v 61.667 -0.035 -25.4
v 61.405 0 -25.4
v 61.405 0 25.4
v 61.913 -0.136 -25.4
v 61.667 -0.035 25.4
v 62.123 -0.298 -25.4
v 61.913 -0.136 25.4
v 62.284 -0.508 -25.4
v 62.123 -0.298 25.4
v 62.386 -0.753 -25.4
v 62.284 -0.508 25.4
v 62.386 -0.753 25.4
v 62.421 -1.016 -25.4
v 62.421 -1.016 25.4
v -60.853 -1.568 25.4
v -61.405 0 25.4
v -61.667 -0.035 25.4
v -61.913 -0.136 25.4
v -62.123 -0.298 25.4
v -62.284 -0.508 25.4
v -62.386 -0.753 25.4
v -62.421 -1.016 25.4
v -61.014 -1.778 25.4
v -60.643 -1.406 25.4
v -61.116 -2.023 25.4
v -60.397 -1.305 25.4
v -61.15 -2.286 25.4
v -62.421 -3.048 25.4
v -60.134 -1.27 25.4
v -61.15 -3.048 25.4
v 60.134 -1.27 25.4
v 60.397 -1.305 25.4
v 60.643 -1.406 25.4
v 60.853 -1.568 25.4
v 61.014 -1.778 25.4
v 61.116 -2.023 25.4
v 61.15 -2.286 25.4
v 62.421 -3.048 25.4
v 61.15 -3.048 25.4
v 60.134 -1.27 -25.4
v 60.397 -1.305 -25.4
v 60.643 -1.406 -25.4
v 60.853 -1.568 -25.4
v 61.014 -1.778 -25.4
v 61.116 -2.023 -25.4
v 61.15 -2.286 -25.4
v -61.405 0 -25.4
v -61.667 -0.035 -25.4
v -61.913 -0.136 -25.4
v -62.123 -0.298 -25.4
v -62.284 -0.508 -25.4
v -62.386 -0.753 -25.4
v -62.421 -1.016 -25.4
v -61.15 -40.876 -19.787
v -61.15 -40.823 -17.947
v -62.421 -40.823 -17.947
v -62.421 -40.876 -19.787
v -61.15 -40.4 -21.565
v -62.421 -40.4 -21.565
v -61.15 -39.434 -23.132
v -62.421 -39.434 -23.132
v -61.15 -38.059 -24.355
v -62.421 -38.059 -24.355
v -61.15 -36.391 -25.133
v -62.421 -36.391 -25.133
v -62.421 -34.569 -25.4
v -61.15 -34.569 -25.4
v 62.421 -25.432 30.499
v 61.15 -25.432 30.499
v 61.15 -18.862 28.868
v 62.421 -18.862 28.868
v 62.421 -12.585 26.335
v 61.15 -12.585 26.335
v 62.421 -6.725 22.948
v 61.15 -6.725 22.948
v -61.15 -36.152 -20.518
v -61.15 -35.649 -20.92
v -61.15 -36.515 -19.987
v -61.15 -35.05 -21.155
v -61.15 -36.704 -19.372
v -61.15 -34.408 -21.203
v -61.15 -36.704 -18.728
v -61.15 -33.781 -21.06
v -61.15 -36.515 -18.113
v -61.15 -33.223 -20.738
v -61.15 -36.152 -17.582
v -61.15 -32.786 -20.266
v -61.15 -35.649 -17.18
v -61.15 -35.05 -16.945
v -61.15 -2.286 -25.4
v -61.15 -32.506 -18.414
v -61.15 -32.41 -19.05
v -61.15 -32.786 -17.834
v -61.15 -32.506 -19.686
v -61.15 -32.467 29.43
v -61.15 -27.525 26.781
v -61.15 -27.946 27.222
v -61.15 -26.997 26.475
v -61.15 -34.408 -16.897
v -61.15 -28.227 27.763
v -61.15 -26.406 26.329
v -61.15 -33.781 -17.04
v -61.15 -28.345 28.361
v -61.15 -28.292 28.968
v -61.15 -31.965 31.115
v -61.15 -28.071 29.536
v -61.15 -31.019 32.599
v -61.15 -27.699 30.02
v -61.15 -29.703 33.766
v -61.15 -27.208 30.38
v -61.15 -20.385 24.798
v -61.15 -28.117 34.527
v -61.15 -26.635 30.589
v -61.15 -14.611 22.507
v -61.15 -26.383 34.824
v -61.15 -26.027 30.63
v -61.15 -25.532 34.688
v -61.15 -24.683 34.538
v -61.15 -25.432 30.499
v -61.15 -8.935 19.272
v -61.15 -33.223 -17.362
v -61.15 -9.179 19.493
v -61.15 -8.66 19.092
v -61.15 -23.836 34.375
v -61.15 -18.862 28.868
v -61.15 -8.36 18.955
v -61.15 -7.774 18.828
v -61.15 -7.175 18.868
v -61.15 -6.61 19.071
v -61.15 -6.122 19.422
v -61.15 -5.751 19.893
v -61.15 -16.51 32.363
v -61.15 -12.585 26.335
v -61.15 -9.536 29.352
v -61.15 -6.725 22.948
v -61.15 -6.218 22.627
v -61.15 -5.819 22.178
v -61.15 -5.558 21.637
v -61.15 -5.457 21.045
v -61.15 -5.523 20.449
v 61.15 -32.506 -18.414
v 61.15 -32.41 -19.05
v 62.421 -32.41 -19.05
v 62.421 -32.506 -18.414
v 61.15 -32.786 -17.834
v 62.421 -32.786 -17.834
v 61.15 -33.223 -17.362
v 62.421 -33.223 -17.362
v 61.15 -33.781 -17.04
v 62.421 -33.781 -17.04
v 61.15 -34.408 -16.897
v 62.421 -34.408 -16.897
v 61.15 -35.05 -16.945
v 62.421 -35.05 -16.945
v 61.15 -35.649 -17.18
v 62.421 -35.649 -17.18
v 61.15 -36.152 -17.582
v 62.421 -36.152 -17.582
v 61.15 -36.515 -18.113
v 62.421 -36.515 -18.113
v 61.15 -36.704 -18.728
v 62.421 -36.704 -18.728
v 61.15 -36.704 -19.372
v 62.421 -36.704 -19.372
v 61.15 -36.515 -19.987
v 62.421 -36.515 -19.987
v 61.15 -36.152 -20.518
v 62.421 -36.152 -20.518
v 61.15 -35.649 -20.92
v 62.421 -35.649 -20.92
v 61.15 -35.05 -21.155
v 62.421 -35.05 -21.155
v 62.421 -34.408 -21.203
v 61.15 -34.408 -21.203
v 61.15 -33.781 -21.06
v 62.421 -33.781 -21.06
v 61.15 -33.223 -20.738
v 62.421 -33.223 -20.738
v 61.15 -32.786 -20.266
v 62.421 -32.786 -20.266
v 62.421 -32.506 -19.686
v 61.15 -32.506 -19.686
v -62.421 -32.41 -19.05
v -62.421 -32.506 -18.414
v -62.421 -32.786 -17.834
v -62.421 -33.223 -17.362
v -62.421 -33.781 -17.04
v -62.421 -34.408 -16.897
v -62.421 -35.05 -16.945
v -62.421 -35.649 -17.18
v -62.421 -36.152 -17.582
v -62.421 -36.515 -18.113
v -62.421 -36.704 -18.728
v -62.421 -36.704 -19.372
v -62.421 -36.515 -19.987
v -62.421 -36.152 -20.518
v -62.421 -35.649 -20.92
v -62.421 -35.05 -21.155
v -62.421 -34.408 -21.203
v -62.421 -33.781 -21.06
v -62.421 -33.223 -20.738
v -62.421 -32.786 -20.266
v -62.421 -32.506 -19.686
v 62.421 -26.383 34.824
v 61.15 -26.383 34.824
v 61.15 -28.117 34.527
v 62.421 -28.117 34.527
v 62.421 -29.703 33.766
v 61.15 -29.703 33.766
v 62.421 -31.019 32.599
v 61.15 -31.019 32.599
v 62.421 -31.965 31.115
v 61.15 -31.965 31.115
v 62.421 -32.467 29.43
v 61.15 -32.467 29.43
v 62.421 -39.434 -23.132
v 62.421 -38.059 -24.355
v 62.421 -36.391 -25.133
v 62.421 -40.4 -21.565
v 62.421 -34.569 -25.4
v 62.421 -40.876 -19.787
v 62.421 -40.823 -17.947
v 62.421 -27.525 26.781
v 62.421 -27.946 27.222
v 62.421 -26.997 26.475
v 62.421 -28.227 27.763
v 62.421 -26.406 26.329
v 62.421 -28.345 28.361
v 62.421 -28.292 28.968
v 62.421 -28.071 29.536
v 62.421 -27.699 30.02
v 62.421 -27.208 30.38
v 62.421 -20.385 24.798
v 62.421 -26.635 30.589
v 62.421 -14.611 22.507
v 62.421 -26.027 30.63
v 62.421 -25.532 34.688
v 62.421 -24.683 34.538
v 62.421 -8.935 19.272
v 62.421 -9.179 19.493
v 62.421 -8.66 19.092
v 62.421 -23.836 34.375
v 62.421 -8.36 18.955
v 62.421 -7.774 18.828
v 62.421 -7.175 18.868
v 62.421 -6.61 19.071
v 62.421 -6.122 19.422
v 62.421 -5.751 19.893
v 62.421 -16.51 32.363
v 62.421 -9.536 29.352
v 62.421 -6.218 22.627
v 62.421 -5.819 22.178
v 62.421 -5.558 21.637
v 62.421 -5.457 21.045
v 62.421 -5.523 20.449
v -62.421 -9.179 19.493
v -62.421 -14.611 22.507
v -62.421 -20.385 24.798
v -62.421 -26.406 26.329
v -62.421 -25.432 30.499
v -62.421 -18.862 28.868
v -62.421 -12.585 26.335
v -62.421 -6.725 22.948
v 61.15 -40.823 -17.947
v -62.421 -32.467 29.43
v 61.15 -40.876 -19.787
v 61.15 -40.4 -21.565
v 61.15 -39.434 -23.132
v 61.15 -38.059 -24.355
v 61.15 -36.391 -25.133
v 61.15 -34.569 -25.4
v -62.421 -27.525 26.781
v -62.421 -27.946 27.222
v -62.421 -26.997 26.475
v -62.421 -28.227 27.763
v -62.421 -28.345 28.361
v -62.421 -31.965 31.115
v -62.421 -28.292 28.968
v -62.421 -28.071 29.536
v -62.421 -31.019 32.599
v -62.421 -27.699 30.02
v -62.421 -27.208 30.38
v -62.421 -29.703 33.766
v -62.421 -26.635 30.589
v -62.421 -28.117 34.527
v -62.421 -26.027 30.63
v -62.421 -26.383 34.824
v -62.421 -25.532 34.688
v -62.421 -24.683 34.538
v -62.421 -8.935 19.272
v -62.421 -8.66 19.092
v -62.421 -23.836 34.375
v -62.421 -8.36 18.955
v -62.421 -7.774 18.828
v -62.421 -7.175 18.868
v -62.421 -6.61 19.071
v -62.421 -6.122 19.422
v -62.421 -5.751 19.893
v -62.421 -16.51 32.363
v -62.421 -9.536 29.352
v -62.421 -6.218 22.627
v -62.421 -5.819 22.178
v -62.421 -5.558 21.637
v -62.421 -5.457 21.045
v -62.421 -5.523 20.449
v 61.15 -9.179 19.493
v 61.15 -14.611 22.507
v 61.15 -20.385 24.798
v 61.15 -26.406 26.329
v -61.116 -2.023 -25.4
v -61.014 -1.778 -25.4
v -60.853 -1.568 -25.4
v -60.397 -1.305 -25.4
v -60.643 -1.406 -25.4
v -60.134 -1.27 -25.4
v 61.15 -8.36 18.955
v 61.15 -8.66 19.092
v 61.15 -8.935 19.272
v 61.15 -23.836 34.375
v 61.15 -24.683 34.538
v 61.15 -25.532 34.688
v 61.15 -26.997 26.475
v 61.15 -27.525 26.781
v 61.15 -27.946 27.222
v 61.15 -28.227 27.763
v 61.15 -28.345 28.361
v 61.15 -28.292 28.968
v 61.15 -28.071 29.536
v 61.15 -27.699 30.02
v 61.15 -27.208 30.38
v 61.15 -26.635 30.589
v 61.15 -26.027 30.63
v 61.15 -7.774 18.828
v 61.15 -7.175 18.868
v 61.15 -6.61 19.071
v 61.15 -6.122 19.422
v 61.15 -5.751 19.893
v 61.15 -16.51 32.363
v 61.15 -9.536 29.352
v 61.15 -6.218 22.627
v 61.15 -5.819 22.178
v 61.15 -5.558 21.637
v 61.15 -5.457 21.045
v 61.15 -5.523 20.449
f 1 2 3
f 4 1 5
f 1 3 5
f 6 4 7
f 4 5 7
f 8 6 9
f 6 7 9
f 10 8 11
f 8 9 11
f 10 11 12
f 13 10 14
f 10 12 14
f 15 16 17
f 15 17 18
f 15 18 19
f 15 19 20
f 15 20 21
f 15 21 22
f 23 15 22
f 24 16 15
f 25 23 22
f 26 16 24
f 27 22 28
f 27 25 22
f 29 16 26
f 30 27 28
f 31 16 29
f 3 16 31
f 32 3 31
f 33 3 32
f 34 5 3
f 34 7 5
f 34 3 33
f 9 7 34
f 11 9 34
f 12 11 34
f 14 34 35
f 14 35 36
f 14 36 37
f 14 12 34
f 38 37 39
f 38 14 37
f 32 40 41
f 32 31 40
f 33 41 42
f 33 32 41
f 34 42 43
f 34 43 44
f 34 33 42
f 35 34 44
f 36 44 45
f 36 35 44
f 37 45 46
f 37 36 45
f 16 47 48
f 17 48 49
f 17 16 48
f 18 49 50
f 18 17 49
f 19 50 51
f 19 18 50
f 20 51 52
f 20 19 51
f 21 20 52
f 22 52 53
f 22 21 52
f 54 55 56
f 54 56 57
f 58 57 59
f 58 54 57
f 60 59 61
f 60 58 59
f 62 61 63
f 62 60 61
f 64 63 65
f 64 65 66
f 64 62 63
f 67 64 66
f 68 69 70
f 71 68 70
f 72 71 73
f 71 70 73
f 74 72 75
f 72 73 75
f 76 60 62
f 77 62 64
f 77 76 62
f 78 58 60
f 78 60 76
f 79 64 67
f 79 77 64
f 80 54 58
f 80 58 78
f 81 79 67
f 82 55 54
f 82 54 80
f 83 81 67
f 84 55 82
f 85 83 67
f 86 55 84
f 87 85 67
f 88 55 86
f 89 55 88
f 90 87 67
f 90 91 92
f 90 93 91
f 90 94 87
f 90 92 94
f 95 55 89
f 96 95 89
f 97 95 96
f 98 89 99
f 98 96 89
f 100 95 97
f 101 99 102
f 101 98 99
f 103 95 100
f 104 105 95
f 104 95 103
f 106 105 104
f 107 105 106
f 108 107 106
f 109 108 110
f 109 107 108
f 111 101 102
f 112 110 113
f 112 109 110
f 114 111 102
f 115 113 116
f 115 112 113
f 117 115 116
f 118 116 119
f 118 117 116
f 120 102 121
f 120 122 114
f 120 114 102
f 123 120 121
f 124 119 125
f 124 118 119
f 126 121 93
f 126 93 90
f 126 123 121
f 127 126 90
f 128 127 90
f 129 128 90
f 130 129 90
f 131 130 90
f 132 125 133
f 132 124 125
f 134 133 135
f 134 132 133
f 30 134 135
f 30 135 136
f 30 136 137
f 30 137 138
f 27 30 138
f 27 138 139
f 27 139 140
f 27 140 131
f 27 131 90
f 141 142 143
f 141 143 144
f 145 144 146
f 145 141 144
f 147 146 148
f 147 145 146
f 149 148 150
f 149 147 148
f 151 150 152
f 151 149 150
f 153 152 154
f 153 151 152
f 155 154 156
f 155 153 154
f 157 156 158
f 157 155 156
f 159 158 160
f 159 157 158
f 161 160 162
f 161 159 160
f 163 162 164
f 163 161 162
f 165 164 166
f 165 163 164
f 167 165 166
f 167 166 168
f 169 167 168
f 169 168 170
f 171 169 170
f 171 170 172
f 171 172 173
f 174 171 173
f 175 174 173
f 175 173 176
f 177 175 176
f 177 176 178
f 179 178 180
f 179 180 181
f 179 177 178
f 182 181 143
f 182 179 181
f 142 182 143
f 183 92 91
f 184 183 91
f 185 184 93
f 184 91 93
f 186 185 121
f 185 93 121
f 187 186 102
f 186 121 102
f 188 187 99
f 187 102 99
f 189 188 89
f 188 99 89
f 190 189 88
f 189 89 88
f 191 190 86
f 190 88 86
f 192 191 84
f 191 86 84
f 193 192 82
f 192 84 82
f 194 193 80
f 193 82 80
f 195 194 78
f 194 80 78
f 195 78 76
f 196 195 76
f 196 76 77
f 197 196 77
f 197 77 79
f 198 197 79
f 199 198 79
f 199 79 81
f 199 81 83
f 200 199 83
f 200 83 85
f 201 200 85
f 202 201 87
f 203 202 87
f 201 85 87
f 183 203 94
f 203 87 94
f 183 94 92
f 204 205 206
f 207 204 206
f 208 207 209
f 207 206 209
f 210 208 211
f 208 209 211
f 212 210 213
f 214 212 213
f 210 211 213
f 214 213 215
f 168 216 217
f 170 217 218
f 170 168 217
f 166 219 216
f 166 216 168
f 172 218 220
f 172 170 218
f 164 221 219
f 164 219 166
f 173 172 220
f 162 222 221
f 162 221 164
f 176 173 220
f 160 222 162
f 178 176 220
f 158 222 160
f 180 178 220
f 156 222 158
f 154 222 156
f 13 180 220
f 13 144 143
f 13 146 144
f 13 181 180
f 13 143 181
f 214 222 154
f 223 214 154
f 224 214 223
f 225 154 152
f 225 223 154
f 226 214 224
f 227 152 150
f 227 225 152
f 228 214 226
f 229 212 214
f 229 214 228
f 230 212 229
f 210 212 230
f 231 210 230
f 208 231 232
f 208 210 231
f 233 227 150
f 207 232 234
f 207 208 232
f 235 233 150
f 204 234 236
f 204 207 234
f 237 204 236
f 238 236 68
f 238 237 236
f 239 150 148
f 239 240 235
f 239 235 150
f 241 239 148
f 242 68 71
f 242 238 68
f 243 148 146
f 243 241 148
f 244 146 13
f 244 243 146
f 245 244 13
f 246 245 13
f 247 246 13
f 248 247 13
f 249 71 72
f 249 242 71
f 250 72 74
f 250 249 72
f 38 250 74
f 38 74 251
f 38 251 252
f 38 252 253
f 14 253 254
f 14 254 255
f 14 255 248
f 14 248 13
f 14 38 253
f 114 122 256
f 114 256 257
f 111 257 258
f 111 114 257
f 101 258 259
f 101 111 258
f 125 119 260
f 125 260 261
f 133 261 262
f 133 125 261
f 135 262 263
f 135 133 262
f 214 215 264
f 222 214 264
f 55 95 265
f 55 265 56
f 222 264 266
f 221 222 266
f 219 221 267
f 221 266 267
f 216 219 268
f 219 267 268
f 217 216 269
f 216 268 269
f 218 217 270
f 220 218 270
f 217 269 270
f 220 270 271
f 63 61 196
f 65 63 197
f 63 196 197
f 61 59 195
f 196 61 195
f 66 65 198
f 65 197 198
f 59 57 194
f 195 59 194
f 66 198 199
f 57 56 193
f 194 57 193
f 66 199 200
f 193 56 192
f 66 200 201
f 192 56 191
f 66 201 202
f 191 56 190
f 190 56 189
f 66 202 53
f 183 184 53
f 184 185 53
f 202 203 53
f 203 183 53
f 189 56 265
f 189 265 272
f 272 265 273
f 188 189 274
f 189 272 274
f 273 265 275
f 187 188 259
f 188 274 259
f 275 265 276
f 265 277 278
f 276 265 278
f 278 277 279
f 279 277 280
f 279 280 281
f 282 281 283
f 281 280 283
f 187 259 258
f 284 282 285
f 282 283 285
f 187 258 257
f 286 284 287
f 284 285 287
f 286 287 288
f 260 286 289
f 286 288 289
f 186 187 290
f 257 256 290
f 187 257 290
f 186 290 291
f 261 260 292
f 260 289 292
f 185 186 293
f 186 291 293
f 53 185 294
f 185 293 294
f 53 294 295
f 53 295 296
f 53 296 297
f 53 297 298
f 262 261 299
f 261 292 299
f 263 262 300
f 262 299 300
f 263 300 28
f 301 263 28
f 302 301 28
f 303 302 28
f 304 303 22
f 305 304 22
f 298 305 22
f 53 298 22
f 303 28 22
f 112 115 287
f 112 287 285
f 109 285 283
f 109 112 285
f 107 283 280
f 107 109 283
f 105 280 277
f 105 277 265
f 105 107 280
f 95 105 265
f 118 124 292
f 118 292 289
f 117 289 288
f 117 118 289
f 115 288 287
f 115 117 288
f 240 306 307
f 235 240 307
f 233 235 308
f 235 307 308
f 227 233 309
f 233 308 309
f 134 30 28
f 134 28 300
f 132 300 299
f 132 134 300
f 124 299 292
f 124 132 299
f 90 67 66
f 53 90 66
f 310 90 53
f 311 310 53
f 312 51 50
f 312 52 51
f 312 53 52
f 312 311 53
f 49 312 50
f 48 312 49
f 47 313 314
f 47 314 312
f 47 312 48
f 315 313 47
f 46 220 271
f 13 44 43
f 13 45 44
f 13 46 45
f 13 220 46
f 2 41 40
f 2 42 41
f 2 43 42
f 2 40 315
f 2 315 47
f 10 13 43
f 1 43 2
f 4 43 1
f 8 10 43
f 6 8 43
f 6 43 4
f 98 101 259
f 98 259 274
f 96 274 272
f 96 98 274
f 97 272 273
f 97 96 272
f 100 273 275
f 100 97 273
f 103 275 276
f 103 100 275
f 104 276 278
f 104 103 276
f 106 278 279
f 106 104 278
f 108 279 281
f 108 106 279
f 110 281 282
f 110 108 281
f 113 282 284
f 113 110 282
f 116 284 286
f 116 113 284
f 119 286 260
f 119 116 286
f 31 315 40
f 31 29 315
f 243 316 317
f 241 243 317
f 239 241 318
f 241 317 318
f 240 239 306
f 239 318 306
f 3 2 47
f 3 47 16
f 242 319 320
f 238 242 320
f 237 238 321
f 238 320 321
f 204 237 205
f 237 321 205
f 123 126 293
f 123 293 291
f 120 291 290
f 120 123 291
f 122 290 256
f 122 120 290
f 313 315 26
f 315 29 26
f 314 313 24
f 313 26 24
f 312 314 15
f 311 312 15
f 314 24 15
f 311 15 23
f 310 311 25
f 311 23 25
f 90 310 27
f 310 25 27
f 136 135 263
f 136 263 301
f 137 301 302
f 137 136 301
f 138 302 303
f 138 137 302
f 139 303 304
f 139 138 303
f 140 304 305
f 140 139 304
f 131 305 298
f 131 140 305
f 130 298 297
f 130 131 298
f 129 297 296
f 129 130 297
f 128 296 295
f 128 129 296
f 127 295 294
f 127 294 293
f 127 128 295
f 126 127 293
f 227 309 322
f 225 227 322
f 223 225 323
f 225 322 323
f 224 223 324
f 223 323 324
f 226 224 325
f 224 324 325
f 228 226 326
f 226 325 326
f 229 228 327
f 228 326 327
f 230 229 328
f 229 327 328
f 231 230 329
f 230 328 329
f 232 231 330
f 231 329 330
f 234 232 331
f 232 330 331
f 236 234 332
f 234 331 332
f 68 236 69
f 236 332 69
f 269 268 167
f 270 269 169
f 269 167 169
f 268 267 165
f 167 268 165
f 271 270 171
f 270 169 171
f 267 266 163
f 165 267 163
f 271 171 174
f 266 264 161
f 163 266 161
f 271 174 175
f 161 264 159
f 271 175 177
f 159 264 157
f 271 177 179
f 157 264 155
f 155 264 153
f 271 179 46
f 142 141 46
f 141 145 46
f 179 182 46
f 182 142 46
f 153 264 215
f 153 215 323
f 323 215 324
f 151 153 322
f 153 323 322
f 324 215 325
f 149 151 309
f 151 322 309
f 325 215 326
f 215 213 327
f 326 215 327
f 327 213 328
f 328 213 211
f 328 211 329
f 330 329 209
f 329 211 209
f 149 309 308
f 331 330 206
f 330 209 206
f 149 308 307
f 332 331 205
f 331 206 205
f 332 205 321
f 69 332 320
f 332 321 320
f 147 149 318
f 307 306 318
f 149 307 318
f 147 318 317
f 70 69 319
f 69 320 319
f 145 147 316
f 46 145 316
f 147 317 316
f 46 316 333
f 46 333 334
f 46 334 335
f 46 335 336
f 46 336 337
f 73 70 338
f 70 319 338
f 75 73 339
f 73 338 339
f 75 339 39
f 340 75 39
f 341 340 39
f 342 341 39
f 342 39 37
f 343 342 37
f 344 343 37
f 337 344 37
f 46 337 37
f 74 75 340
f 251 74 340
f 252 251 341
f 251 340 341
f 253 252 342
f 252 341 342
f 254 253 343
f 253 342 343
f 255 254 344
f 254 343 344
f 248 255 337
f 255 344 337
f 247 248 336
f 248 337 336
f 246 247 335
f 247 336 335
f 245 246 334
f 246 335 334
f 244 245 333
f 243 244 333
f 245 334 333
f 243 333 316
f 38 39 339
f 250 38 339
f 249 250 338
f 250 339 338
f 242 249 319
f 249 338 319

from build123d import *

# Parameters (mm, degrees)
F0_W     = 122.301
F0_H     = 50.8
F1_DEPTH = 1.27
F2_W     = 1.27
F2_H     = 50.8
F2_R     = 2.159
F3_DEPTH = 1.27
F5_R     = 1.016


with BuildPart() as f1:
    # F0 (on Front) → F1 (new body)
    with BuildSketch(Plane.XZ):
        Rectangle(F0_W, F0_H)
    extrude(amount=F1_DEPTH)

    # F2 (on face) → F3 (join)
    with BuildSketch(Plane.YZ.offset(61.1505)):
        with Locations((-0.635, 0)):
            Rectangle(F2_W, F2_H)
        with BuildLine():
            Line((-34.5694, -25.4), (-1.27, -25.4))
            Line((-1.27, -25.4), (-1.27, 25.4))
            Line((-1.27, 25.4), (-3.048, 25.4))
            ThreePointArc((-3.048, 25.4), (-12.9705871442, 30.9789160504), (-23.835727376, 34.3746144578))
            ThreePointArc((-23.835727376, 34.3746144578), (-25.1069267062, 34.6143527598), (-26.3834586647, 34.8238482236))
            ThreePointArc((-26.3834586647, 34.8238482236), (-30.4019207613, 33.2281345448), (-32.4672506211, 29.4296147888))
            Line((-32.4672506211, 29.4296147888), (-40.8229292316, -17.9473340718))
            ThreePointArc((-40.8229292316, -17.9473340718), (-39.4337822138, -23.1317013215), (-34.5694, -25.4))
        make_face()
        with Locations((-34.5694, -19.05)):
            Circle(F2_R, mode=Mode.SUBTRACT)
        with BuildLine():
            ThreePointArc((-26.4055731828, 26.3286980436), (-28.291565828, 28.9678233876), (-25.4317316722, 30.4986073176))
            ThreePointArc((-25.4317316722, 30.4986073176), (-15.6793239493, 27.7117353818), (-6.7247772333, 22.9481018219))
            ThreePointArc((-6.7247772333, 22.9481018219), (-5.617517065, 20.1630344292), (-8.3603573385, 18.954956329))
            ThreePointArc((-8.3603573385, 18.954956329), (-8.8006503817, 19.1767894333), (-9.1791381358, 19.4927244109))
            ThreePointArc((-9.1791381358, 19.4927244109), (-17.4611225454, 23.7454080866), (-26.4055731828, 26.3286980436))
        make_face(mode=Mode.SUBTRACT)
    extrude(amount=F3_DEPTH)

    # F4: F1 across plane


with BuildPart() as f1_1:
    add(f1.part)
    add(f1.part.mirror(Plane.YZ))

    # F5
    f5_edges = [f1_1.edges().sort_by_distance(p)[0] for p in [
        (-62.4205, 0, 0),
        (62.4205, 0, 0),
        (61.1505, -1.27, 0),
        (-61.1505, -1.27, 0),
    ]]
    fillet(f5_edges, radius=F5_R)


solid = f1_1.part
